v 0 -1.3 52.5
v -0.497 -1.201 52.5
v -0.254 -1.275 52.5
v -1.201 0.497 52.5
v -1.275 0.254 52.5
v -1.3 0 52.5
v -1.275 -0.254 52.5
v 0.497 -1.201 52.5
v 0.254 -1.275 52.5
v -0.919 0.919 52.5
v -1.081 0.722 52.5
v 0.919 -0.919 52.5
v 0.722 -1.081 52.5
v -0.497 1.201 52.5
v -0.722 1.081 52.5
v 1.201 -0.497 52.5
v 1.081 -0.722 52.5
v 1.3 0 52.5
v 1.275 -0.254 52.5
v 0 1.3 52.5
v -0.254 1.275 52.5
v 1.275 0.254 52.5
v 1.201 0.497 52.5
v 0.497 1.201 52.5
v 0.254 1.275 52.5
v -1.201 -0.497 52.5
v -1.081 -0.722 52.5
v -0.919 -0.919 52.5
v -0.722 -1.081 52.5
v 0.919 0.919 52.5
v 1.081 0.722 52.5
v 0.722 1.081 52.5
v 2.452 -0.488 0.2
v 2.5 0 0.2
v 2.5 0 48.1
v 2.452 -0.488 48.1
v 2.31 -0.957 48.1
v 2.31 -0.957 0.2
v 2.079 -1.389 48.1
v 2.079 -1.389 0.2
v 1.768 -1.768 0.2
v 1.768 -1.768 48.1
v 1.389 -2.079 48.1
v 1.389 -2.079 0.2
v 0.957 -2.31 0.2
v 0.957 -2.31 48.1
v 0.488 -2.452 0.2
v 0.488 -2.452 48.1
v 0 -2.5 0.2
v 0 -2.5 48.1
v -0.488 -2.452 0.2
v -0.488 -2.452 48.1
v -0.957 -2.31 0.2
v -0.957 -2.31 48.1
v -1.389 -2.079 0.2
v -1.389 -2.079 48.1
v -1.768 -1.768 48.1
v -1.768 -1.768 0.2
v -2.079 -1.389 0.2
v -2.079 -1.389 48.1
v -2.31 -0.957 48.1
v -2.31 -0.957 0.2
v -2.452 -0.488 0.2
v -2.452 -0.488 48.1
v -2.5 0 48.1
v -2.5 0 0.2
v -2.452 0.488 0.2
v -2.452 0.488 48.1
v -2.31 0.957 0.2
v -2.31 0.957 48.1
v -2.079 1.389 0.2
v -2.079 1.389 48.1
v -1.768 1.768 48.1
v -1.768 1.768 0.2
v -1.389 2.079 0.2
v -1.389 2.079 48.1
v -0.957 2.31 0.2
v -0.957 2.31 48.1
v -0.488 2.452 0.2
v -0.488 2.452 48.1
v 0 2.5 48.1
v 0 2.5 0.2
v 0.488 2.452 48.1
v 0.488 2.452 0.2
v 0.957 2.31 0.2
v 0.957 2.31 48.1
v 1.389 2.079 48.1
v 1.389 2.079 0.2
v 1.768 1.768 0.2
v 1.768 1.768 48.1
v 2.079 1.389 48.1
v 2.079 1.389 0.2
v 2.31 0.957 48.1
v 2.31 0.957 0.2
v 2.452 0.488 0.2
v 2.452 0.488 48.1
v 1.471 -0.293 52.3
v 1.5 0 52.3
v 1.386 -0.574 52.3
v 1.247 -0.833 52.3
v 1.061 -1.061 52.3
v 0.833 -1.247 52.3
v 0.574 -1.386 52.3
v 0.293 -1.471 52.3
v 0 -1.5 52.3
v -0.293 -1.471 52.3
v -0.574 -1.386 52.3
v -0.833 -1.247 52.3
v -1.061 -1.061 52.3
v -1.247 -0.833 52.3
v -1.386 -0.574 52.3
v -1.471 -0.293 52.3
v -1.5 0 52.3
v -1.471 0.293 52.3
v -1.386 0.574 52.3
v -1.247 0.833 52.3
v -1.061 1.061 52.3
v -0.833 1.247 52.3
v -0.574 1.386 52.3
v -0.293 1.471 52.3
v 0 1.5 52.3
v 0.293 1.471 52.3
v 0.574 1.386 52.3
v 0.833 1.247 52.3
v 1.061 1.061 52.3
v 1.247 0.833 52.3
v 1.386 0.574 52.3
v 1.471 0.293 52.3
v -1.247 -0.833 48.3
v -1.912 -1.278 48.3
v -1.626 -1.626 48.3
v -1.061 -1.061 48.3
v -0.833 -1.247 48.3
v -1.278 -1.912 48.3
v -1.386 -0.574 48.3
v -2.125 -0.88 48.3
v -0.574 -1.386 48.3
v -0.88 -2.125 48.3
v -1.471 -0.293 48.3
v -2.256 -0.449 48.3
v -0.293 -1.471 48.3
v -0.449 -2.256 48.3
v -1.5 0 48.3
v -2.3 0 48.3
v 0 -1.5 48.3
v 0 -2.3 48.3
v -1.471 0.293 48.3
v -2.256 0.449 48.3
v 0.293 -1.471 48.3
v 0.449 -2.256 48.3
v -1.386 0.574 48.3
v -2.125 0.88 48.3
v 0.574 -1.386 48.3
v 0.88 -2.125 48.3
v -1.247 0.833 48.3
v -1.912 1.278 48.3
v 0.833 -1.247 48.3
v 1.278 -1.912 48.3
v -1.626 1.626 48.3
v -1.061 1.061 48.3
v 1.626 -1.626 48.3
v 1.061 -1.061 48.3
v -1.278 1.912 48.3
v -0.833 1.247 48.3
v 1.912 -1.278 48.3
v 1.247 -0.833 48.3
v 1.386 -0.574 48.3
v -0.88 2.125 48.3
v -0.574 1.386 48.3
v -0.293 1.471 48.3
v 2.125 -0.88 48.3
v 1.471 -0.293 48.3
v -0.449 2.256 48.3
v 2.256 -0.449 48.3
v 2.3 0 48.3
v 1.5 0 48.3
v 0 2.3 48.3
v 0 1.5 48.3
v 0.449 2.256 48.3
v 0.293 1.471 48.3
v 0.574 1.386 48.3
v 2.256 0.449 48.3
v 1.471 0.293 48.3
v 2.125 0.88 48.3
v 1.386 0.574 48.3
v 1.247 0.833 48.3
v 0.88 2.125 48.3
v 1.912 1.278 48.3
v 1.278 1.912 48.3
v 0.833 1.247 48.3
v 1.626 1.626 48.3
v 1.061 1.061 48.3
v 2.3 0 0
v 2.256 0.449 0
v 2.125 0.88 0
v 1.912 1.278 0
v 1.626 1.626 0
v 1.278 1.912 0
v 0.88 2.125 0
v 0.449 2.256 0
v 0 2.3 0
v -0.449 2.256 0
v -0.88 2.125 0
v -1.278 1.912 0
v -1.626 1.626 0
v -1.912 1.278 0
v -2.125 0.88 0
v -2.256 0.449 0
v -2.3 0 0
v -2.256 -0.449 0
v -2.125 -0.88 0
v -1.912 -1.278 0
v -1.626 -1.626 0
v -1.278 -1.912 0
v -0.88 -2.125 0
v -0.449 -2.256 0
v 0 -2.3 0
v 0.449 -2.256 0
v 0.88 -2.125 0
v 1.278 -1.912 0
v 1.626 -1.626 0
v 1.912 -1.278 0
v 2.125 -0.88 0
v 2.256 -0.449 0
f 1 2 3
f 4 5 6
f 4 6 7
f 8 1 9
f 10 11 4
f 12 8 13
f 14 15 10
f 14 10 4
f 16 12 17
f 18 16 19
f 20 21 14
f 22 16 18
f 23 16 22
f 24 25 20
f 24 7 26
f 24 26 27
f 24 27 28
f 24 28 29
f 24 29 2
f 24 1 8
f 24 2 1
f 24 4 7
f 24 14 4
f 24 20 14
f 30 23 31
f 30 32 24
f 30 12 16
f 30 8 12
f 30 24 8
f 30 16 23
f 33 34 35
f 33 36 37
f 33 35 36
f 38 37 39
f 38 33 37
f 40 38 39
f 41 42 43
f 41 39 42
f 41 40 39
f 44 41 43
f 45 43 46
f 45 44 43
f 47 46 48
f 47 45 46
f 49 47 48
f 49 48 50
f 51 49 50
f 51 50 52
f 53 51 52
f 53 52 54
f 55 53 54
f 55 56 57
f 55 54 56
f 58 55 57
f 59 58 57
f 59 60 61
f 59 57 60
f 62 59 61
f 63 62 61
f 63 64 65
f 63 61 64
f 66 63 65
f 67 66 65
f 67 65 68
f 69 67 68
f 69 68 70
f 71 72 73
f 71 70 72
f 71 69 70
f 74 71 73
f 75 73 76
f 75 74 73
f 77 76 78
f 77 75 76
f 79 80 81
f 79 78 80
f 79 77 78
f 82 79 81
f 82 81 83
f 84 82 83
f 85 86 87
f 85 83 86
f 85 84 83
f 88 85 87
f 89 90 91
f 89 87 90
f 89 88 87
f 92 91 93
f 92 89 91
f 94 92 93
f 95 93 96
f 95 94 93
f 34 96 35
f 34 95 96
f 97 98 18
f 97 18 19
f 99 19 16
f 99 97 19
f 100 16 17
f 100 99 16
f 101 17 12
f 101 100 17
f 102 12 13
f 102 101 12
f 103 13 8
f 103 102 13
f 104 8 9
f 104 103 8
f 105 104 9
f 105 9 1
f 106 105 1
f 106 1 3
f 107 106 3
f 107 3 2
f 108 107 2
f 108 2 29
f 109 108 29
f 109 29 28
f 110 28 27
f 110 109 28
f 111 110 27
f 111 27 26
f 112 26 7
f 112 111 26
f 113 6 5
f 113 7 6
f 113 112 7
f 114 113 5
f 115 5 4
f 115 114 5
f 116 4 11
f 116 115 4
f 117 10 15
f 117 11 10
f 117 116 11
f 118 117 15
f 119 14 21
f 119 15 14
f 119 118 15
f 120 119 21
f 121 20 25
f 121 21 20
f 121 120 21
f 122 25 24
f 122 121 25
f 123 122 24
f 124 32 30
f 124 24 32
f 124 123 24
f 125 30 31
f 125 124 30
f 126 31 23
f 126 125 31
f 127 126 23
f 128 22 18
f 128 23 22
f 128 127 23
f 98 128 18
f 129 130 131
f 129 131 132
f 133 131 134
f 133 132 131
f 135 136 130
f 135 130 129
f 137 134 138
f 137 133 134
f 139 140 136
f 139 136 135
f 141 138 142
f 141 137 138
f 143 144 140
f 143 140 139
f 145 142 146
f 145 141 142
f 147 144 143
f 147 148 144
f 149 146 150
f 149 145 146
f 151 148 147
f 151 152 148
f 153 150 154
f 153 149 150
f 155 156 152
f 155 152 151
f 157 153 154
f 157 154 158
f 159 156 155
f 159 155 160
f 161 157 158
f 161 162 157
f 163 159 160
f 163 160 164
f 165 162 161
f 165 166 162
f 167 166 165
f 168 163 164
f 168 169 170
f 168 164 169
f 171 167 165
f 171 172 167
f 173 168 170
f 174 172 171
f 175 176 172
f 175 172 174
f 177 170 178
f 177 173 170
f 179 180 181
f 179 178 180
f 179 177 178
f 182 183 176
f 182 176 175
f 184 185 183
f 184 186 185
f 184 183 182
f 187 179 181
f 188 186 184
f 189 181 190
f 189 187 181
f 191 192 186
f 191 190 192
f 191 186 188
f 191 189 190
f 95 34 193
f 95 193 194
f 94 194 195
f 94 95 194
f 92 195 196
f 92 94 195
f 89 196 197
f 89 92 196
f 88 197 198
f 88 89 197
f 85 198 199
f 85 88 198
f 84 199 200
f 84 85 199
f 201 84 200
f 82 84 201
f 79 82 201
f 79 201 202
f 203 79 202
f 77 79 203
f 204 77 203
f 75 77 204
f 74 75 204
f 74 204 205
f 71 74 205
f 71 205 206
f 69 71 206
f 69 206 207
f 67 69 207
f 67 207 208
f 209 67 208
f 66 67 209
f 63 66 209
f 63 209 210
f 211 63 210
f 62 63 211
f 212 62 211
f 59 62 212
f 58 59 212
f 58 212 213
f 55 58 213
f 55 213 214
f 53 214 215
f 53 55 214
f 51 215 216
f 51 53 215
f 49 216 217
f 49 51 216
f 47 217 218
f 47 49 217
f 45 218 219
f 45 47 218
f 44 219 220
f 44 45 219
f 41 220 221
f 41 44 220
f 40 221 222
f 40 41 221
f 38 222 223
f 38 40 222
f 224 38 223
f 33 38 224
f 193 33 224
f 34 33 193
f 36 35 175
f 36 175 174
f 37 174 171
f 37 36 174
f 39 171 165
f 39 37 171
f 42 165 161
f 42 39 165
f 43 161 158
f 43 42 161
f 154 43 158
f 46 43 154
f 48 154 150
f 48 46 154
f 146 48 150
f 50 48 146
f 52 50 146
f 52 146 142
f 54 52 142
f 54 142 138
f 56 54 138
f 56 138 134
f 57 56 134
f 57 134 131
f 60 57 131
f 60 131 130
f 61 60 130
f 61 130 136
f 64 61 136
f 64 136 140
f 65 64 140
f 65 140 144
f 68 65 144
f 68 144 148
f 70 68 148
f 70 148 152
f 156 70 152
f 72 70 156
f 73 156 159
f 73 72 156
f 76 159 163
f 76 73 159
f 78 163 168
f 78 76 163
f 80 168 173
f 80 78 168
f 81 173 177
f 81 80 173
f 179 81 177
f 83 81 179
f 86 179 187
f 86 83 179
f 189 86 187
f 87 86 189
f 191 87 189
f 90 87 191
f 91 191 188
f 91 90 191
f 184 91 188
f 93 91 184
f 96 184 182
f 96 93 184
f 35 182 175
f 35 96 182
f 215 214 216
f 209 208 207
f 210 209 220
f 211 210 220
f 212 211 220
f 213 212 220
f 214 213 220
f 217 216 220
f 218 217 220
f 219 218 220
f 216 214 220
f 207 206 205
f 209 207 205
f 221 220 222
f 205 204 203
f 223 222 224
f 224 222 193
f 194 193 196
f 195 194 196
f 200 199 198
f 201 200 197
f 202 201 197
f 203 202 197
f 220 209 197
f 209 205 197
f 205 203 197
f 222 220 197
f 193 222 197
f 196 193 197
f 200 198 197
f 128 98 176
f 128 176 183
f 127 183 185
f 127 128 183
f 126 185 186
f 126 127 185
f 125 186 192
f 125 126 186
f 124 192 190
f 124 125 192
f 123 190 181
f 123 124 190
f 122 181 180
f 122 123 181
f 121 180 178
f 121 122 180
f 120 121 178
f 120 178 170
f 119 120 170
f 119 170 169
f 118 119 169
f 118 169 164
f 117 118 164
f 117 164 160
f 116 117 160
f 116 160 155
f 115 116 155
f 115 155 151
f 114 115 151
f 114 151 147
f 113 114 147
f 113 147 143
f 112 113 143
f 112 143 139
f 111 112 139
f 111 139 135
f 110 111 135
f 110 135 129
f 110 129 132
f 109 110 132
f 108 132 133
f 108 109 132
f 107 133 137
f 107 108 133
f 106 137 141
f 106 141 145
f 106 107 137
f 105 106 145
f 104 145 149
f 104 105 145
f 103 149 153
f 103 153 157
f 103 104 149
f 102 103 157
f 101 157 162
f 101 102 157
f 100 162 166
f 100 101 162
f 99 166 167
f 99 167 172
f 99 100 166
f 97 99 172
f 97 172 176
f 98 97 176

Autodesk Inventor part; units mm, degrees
ref_plane "YZ Plane" through (0, 0, 0) normal (1, 0, 0) x (0, 1, 0)
ref_plane "XZ Plane" through (0, 0, 0) normal (0, 1, 0) x (-1, 0, 0)
ref_plane "XY Plane" through (0, 0, 0) normal (0, 0, 1) x (1, 0, 0)
sketch "Sketch1" plane through (0, 0, 0) normal (0, 0, 1) x (1, 0, 0)
  circle A0 centre (0, 0) radius 2.5
  dimension "d0" = 5
extrude "Extrusion1" add sketch "Sketch1" along normal blind 52.5
sketch "Sketch2" plane through (0, 0, 52.5) normal (0, 0, 1) x (1, 0, 0)
  circle A0 centre (0, 0) radius 2.5 projected
  circle A1 centre (0, 0) radius 1.5
  dimension "d3" = 3
extrude "Extrusion2" cut sketch "Sketch2" against normal blind 4.2
chamfer "Chamfer1" distance 0.2 angle 45 3 edges at (-1.5, 0, 52.5) (-2.5, 0, 48.3) (-2.5, 0, 0)
properties part number "SensorKopf_Encoder_Welle" material "Aluminum 6061-AHC"
